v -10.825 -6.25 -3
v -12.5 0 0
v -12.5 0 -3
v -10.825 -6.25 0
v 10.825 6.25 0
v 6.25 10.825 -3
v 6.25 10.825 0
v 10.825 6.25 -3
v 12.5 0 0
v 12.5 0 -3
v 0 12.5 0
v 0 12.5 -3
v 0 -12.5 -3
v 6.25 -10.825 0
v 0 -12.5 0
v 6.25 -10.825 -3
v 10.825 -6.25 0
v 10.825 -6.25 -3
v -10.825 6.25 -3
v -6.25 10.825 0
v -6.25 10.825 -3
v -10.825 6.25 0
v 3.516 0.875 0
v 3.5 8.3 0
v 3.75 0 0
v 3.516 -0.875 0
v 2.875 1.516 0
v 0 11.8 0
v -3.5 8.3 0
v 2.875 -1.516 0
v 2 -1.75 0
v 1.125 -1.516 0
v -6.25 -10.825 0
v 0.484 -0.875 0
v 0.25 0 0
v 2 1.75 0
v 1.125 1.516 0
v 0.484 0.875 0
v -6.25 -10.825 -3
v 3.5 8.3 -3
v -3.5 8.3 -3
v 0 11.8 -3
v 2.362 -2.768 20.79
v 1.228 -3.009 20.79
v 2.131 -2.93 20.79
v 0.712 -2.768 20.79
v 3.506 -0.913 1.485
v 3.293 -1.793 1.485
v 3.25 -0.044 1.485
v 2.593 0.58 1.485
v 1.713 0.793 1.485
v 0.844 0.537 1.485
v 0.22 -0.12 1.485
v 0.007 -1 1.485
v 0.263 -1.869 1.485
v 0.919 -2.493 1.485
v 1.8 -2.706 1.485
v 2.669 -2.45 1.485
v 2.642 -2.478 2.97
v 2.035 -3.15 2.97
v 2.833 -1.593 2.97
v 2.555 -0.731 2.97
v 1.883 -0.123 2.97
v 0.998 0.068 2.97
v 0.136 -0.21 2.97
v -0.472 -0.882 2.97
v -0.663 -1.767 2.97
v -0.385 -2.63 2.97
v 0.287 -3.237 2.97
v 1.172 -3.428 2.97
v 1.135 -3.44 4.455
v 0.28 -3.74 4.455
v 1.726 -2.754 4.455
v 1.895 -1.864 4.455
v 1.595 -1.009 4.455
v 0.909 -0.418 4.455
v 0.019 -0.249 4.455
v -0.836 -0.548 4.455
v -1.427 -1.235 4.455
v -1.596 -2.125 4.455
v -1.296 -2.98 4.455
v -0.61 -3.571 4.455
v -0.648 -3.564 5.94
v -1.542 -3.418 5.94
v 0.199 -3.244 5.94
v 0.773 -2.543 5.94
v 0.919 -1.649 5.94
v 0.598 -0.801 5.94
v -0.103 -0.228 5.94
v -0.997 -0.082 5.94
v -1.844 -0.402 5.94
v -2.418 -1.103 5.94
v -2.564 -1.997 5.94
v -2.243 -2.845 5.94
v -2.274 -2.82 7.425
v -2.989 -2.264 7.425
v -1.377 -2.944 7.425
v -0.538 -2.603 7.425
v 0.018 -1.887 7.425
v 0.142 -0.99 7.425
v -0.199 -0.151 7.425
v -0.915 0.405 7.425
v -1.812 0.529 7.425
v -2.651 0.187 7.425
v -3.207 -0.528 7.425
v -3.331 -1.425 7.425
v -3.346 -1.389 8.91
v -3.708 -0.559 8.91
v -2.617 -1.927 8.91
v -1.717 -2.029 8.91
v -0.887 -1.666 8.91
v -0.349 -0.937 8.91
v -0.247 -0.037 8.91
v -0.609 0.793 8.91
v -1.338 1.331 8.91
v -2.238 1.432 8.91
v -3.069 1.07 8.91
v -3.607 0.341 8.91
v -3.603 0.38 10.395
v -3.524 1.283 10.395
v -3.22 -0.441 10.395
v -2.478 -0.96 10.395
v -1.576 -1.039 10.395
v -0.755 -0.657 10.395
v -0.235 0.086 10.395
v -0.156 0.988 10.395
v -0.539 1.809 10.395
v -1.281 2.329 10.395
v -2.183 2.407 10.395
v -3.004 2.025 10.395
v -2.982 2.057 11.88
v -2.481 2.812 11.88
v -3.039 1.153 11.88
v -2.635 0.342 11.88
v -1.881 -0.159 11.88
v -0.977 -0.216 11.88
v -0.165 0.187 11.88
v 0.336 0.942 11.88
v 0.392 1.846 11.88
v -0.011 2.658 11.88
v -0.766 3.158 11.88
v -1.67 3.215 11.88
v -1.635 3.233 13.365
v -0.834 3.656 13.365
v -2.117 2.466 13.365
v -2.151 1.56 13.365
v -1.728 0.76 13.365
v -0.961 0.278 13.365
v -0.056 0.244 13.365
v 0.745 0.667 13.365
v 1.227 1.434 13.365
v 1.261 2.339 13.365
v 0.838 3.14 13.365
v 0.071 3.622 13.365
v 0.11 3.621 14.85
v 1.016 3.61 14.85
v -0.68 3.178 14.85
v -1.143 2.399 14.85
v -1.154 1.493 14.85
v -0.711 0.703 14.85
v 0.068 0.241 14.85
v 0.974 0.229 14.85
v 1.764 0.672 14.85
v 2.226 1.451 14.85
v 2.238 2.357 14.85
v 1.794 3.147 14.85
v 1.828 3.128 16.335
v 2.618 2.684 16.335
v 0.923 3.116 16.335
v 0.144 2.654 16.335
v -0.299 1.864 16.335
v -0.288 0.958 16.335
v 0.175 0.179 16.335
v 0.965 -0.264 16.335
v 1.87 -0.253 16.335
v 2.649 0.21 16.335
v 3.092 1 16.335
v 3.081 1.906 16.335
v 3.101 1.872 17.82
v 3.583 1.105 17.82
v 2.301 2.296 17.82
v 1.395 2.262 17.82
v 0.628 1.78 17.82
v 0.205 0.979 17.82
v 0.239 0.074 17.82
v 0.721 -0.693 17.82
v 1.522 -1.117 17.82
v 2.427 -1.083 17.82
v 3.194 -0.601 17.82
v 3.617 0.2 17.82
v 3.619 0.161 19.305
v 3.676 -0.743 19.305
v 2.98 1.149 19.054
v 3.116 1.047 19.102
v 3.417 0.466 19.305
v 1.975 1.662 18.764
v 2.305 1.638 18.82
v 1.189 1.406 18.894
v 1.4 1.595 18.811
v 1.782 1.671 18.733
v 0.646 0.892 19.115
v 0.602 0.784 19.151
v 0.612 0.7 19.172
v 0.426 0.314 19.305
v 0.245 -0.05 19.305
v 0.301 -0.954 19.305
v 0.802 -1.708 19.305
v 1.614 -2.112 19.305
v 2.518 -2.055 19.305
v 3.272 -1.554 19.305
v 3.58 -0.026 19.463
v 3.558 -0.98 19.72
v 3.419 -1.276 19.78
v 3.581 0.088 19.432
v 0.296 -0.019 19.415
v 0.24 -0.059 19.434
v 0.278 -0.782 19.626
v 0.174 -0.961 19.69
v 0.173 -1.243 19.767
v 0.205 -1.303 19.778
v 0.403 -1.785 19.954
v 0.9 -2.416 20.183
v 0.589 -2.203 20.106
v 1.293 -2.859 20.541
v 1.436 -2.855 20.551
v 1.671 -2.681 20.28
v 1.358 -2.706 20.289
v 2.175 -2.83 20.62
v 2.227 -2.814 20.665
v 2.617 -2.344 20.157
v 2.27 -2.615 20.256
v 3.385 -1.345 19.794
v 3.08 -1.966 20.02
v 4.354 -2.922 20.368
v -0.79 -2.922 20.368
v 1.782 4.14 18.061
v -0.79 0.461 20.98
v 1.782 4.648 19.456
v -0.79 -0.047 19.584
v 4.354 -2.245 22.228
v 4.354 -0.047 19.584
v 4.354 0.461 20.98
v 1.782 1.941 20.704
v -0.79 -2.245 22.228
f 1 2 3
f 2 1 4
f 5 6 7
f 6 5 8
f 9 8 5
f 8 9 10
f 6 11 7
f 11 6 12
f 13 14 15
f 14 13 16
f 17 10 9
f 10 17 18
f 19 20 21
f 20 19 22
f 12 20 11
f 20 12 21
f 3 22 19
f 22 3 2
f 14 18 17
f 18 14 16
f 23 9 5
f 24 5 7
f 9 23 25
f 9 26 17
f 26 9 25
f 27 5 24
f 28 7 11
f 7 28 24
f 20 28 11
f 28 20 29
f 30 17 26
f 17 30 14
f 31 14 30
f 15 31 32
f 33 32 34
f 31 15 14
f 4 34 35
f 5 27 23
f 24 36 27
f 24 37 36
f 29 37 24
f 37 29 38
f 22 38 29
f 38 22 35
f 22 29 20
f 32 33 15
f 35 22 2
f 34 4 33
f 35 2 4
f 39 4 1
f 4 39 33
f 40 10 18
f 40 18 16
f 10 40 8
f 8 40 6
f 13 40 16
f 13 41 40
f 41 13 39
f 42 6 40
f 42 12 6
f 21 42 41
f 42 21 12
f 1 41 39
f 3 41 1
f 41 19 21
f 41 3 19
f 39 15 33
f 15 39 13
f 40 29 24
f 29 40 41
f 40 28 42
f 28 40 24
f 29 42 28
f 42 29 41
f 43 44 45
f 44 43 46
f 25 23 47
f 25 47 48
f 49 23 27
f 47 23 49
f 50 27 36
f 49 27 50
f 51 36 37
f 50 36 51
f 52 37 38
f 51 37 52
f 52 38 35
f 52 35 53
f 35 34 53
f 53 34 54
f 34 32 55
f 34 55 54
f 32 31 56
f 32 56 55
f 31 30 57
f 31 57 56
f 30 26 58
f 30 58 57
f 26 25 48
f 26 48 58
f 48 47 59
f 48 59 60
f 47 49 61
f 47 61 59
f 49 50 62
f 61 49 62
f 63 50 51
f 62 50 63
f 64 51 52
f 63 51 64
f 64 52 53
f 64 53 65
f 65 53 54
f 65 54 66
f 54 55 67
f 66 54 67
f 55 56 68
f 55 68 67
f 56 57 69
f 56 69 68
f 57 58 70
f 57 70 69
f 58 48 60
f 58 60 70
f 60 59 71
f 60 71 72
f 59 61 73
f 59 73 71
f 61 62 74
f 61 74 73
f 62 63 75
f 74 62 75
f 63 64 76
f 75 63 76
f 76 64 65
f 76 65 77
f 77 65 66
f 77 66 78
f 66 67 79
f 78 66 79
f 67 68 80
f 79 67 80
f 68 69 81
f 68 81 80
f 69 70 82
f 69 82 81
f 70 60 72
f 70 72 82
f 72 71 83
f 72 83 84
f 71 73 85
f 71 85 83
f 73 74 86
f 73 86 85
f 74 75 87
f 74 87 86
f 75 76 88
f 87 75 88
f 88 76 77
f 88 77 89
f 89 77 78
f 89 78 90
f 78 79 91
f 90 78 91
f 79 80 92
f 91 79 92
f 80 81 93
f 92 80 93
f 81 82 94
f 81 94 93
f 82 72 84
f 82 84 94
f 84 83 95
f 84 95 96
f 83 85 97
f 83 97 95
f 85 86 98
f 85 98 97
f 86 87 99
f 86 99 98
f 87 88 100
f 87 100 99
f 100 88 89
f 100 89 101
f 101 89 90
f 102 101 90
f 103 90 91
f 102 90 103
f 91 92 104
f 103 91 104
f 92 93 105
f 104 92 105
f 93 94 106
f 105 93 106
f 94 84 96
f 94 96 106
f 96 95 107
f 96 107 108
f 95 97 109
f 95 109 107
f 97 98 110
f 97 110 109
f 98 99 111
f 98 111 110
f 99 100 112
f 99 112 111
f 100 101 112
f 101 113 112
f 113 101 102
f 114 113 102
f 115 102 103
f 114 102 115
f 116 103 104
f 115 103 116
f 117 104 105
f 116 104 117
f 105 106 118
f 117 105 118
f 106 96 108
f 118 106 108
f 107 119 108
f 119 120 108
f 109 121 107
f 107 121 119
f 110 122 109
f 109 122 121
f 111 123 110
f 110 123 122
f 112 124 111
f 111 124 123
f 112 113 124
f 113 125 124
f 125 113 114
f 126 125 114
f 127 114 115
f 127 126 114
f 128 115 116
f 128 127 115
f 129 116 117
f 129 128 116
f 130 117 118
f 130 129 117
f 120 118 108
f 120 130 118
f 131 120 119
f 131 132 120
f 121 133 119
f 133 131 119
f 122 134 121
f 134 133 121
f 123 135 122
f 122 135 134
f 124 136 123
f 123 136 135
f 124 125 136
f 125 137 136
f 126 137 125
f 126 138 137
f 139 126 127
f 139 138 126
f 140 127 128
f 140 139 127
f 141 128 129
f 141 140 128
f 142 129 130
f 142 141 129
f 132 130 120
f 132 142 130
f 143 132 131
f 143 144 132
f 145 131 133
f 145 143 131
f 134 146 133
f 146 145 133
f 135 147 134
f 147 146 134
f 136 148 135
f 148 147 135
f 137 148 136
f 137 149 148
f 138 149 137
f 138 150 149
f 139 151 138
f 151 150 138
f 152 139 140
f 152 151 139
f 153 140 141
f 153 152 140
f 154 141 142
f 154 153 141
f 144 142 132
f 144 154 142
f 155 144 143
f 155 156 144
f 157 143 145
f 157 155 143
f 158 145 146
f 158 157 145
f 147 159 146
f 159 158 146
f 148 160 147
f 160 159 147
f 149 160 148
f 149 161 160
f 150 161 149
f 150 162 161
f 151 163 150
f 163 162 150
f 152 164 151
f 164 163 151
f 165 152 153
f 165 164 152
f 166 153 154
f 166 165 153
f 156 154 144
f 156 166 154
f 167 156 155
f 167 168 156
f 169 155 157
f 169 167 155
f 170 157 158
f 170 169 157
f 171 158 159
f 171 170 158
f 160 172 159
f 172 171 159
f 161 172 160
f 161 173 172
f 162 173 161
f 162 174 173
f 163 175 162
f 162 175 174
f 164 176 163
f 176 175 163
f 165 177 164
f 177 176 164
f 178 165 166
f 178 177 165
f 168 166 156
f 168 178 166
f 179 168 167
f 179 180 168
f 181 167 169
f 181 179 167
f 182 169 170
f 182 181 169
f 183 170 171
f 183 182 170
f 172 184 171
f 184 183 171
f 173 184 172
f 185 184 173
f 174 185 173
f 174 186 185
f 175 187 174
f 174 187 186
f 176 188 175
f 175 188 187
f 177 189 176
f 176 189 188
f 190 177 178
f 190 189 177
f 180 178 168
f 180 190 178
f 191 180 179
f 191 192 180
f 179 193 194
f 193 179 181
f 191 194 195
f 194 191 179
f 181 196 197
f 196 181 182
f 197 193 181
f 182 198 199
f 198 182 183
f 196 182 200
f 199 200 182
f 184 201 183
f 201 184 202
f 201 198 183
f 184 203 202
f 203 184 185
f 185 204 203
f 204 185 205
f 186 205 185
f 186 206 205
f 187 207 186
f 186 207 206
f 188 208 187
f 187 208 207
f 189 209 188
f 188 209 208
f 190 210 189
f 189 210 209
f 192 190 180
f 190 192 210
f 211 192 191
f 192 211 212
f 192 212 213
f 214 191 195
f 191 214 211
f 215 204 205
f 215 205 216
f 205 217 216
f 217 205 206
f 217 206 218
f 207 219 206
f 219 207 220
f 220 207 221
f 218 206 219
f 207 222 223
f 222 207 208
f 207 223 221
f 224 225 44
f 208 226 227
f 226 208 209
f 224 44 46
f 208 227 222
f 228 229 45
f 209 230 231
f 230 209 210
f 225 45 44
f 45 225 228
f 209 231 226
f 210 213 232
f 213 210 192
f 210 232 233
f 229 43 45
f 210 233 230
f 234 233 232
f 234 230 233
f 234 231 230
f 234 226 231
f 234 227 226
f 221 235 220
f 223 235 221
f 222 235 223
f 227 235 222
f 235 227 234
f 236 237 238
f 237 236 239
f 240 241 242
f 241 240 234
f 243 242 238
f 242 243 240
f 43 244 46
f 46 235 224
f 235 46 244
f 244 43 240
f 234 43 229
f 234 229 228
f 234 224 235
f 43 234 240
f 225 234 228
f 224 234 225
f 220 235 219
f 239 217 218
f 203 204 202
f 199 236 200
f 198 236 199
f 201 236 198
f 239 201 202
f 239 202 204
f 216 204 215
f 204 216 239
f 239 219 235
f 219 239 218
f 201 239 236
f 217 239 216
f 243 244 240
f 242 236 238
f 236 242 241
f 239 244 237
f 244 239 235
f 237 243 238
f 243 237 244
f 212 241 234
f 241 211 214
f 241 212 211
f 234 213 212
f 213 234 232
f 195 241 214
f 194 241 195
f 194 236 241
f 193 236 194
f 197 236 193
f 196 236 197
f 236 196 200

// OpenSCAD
// file: cadence.scad
// cadence 8309ae0.scad
// https://github.com/jmettraux/cadence.scad


// as of 2019.05, OpenSCAD understands
// is_num, is_list, is_string, and, is_bool
//
// is_function is coming, but looks tricky



function _normalize_angle(a) =
  ((a >= 0 && a <= 360) ? a : _normalize_angle(a + (a < 0 ? 360 : -360)));


//
// dictionary functions

function _aaget(dict, key, default, off) =
  let (kv = dict[off])
    kv == undef ? default :
    kv[0] == key ? kv[1] :
      _aaget(dict, key, default, off + 1);

function _asget(dict, key, default, off) =
  dict[off] == undef ? default :
  dict[off] == key ? dict[off + 1] :
    _asget(dict, key, default, off + 2);

function _get(dict, key, default=undef) =
  is_string(dict[0]) ?
    _asget(dict, key, default, 0) :
    _aaget(dict, key, default, 0);

function _del(dict, key) =
  [ for (kv = dict) if (kv[0] != key) kv ];

function _put(dict, key, value) =
  concat(_del(dict, key), [ [ key, value ] ]);


//
// list functions

function _idx(list, index, default=undef) =
  let (
    i = index < 0 ? len(list) + index : index,
    r = list[i]
  )
    r == undef ? default : r;

  // sublist
  //
function _slist(list, from=0, to) =
  let(
    li = len(list) - 1,
    end = (to == undef ? li : to),
    a0 = from < 0 ? li + 1 + from : from,
    a = a0 < 0 ? 0 : a0,
    z = end < 0 ? li + 1 + end : end
  )
    a > li ? [] :
    z < a ? [] :
      [ for (i = [a:z]) list[i] ];

function _reverse(list) =
  [ for (i = [ len(list) - 1 : -1 : 0 ]) list[i] ];

//
// point functions

  // Accept a single angle instead of [ angle0, angle1 ]
  // 'sp' is the start point
  //
function _to_point(length, angles, sp=[ 0, 0, 0 ]) =
  let(
    as = is_num(angles) ? [ angles, 0 ] : angles,
    inclination = as[0],
    azimuth = as[1] + 90
  )
    sp + [
      length * cos(inclination) * cos(azimuth),
      length * cos(inclination) * sin(azimuth),
      length * sin(inclination) ];

function _to_spherical(point) =
  let(
    l = norm(point),
    ele = asin(point.z / l),
    dir = atan2(point.y, point.x)
  )
    [ l, [ ele, dir - 90 ] ];


function _midpoint(p0, p1, ratio=0.5) =
  let(
    s = _to_spherical(p1 - p0)
  )
    _to_point(ratio * s[0], s[1], p0);

//function _vlen(vector) =
//  sqrt(pow(vector.x, 2) + pow(vector.y, 2) + pow(vector.z, 2));
  //
  // no, use norm(vector)


// inspiration:
// https://climberg.de/post/openscad_bezier_curves_of_any_degrees

function _bezier_choose(n, k) =
  k == 0 ?  1 : (n * _bezier_choose(n - 1, k - 1)) / k;

function _bezier_point(points, t, i, c) =
  len(points) == i ?
    c :
    _bezier_point(
      points,
      t,
      i + 1,
      c +
        _bezier_choose(len(points) - 1, i) *
        pow(t, i) *
        pow(1 - t, len(points) - i - 1) * points[i]);

function _bezier_points(control_points, sample_count) =
  [ for (t = [ 0 : 1.0 / sample_count : 1 ])
    _bezier_point(control_points, t, 0, [ 0, 0 ]) ];


//
// modules

module polypoints(points) {

  for (i = [ 0 : len(points) - 1 ]) {
    translate(points[i]) children(i % $children);
  }
}

module polyhulls(points) {

  for (i = [ 0 : len(points) - 2 ]) {

    hull() {
      translate(points[i]) children(i % $children);
      translate(points[i + 1]) children((i + 1) % $children);
    }
  }
}


// pineapple slice
//
module paslice(radius, depth, slice=45, radius1=0) {

  s = _normalize_angle(slice);
  r = radius;

  if (s > 0) difference() {

    cylinder(depth, r=r);

    translate([ 0, 0, -0.1 ]) cylinder(depth * 1.1, r=radius1);

    if (s != 360) {

      pas = [
        [ 0, r ], [ 0, 0 ] ];
      pbs = [
        [ r, r ], [ r, 0 ], [ r, -r ], [ 0, -r ], [ -r, -r ], [ -r, 0 ],
        [ -r, r ] ];

      t = tan(s);
      tx = t * r;
      ty = r / t;

      translate([ 0, 0, -0.1 ]) linear_extrude(depth + 0.2)
        if (s <= 45)
          polygon(concat(pas, [ [ tx, r ] ], pbs));
        else if (s <= 135)
          polygon(concat(pas, [ [ r, ty ] ], _slist(pbs, 2)));
        else if (s <= 225)
          polygon(concat(pas, [ [ -tx, -r ] ], _slist(pbs, 4)));
        else if (s <= 315)
          polygon(concat(pas, [ [ -r, -ty ] ], _slist(pbs, 6)));
        else if (s < 360)
          polygon(concat(pas, [ [ tx, r ] ]));
    }
  }
}


// dome with optional trunk_height
//
module dome(radius=-1, diameter=-1, trunk_height=0) {

  r = radius < 0 ? diameter / 2 : radius;
  th = trunk_height;

  translate([ 0, 0, th ])
    difference() {
      sphere(r=r);
      translate([ 0, 0, -r ]) cube(2 * r, center=true);
    }
  translate([ 0, 0, th / 2 ])
    cylinder(r=r, h=th, center=true);
}
// file: minilib.scad
//
// minilib.scad
//

use <cadence.scad>;


//
// point base

module base(
  diameter=25,
  thickness=3,
  arrow_base=7, text="", font="helvetica", font_size=6, font_spacing=0.7
) {

  d_2 = diameter / 2;
  ab_2 = arrow_base / 2;
  t12 = 1.2 * thickness;

  translate([ 0, 0, - thickness / 2 ]) // place base just under horizon
    difference() {

      union() {

        // base
        cylinder(d=diameter, h=thickness, center=true);

        // text
        translate([ - diameter / 2.6, -diameter / 3, thickness / 2 ])
          linear_extrude(0.7)
            text(text, size=font_size, font=font, spacing=font_spacing);
      }

      // arrow
      translate([ 0, d_2 - 1.2 * ab_2, -0.5 * t12 ])
        linear_extrude(t12)
          polygon([ [ -ab_2, 0 ], [ 0, ab_2 ], [ ab_2, 0 ] ]);
    }
}
// main file
//
// snake.scad
//

include <minilib.scad>;


$fn = 12;

hei = 33 * 0.63; // height
dia = 3.5; // diameter
con = 10; // convexity
twi = 400; // twist

hsi = hei / 3.5; // head side


base(text="", $fn=12);

module head() {
  rotate([ 0, 0, 90 ]) hull() {
    cylinder(d=hsi, h=hsi / 3, center=true, $fn=3);
    translate([ hsi / 2, 0, 0 ]) cylinder(d=hsi, h=hsi / 4, center=true, $fn=3);
  }
}

module body() {
  translate([ 0, 0, hei / 2 ])
    linear_extrude(height=hei, center=true, convexity=con, twist=twi)
      translate([ 2, 0, 0 ])
        circle(d=dia);
}


body();
translate([ hsi * 0.3, -hsi * 0.2, hei ]) rotate([ -20, 0, 0 ]) head();
